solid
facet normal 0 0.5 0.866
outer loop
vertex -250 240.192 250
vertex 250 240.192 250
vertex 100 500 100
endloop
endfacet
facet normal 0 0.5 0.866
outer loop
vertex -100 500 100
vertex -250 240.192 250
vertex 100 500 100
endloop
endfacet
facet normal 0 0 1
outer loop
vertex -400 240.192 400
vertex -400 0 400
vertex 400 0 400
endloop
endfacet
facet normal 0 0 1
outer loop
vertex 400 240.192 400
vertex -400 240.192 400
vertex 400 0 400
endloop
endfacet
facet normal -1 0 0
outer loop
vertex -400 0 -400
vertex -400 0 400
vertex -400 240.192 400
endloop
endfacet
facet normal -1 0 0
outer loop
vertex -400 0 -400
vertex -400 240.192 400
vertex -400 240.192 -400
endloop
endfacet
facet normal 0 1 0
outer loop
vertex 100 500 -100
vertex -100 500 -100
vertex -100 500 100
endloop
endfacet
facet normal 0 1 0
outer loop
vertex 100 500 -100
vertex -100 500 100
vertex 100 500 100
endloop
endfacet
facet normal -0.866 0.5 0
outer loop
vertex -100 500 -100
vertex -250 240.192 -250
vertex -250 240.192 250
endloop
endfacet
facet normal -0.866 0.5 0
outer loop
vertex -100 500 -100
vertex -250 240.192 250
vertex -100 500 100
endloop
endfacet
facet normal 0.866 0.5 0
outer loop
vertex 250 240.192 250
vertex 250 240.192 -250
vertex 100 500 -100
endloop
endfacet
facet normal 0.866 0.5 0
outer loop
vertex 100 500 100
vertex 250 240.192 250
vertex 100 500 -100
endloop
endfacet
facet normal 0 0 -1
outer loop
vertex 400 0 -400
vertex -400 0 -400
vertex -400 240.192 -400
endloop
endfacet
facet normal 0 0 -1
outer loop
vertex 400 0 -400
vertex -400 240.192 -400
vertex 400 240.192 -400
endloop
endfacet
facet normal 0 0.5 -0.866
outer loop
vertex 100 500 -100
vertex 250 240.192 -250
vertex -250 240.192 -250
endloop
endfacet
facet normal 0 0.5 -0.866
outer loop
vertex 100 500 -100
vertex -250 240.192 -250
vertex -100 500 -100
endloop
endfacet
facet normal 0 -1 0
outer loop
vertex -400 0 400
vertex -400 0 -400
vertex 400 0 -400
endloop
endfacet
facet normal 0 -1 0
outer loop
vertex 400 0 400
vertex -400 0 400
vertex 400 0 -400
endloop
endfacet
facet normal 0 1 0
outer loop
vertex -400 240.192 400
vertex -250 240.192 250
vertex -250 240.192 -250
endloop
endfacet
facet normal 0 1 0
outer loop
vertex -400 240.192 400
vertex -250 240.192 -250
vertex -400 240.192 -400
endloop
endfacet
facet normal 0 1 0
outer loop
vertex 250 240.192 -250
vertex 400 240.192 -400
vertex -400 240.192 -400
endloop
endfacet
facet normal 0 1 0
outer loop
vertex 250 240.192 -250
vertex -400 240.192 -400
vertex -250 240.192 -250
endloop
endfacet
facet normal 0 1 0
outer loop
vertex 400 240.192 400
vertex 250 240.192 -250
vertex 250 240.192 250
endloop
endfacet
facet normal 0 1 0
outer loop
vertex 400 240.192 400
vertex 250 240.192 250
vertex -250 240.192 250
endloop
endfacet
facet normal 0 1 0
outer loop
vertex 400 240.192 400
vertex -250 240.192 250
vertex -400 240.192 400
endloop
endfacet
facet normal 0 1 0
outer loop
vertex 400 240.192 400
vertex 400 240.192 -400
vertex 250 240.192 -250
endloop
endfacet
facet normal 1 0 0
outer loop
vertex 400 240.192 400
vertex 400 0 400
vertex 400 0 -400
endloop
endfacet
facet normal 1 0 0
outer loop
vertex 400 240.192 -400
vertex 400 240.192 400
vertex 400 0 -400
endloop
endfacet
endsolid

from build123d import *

# Parameters (mm, degrees)
SKETCH_1_W               = 800
SKETCH_1_H               = 800
EXTRUDE_1_DEPTH          = 500
CUT_EXTRUDE_1_DEPTH      = 1025.695076596
CUT_EXTRUDE_1_DEPTH_BACK = 1025.695076596
CUT_EXTRUDE_2_DEPTH      = 1025.695076596
CUT_EXTRUDE_2_DEPTH_BACK = 1025.695076596


with BuildPart() as part:
    # 草图1 → 凸台-拉伸1 (new body)
    with BuildSketch(Plane(origin=(0, 0, 0), x_dir=(1, 0, 0), z_dir=(0, 1, 0))):
        Rectangle(SKETCH_1_W, SKETCH_1_H)
    extrude(amount=EXTRUDE_1_DEPTH)

    # 草图2 → 切除-拉伸1 (cut, two sides: drawn at the far end of the back side and taken through both)
    with BuildSketch(Plane.ZY.offset(400).offset(-CUT_EXTRUDE_1_DEPTH_BACK)):
        Polygon((-400, 240.192378865), (-250, 240.192378865), (-100, 500), (-400, 500), align=None)
        Polygon((250, 240.192378865), (100, 500), (400, 500), (400, 240.192378865), align=None)
    extrude(amount=CUT_EXTRUDE_1_DEPTH + CUT_EXTRUDE_1_DEPTH_BACK, mode=Mode.SUBTRACT)

    # 草图3 → 切除-拉伸2 (cut, two sides: drawn at the far end of the back side and taken through both)
    with BuildSketch(Plane(origin=(0, 0, -400), x_dir=(-1, 0, 0), z_dir=(0, 0, -1)).offset(-CUT_EXTRUDE_2_DEPTH_BACK)):
        Polygon((-400, 240.192378865), (-250, 240.192378865), (-100, 500), (-400, 500), align=None)
        Polygon((250, 240.192378865), (100, 500), (400, 500), (400, 240.192378865), align=None)
    extrude(amount=CUT_EXTRUDE_2_DEPTH + CUT_EXTRUDE_2_DEPTH_BACK, mode=Mode.SUBTRACT)


solid = part.part
